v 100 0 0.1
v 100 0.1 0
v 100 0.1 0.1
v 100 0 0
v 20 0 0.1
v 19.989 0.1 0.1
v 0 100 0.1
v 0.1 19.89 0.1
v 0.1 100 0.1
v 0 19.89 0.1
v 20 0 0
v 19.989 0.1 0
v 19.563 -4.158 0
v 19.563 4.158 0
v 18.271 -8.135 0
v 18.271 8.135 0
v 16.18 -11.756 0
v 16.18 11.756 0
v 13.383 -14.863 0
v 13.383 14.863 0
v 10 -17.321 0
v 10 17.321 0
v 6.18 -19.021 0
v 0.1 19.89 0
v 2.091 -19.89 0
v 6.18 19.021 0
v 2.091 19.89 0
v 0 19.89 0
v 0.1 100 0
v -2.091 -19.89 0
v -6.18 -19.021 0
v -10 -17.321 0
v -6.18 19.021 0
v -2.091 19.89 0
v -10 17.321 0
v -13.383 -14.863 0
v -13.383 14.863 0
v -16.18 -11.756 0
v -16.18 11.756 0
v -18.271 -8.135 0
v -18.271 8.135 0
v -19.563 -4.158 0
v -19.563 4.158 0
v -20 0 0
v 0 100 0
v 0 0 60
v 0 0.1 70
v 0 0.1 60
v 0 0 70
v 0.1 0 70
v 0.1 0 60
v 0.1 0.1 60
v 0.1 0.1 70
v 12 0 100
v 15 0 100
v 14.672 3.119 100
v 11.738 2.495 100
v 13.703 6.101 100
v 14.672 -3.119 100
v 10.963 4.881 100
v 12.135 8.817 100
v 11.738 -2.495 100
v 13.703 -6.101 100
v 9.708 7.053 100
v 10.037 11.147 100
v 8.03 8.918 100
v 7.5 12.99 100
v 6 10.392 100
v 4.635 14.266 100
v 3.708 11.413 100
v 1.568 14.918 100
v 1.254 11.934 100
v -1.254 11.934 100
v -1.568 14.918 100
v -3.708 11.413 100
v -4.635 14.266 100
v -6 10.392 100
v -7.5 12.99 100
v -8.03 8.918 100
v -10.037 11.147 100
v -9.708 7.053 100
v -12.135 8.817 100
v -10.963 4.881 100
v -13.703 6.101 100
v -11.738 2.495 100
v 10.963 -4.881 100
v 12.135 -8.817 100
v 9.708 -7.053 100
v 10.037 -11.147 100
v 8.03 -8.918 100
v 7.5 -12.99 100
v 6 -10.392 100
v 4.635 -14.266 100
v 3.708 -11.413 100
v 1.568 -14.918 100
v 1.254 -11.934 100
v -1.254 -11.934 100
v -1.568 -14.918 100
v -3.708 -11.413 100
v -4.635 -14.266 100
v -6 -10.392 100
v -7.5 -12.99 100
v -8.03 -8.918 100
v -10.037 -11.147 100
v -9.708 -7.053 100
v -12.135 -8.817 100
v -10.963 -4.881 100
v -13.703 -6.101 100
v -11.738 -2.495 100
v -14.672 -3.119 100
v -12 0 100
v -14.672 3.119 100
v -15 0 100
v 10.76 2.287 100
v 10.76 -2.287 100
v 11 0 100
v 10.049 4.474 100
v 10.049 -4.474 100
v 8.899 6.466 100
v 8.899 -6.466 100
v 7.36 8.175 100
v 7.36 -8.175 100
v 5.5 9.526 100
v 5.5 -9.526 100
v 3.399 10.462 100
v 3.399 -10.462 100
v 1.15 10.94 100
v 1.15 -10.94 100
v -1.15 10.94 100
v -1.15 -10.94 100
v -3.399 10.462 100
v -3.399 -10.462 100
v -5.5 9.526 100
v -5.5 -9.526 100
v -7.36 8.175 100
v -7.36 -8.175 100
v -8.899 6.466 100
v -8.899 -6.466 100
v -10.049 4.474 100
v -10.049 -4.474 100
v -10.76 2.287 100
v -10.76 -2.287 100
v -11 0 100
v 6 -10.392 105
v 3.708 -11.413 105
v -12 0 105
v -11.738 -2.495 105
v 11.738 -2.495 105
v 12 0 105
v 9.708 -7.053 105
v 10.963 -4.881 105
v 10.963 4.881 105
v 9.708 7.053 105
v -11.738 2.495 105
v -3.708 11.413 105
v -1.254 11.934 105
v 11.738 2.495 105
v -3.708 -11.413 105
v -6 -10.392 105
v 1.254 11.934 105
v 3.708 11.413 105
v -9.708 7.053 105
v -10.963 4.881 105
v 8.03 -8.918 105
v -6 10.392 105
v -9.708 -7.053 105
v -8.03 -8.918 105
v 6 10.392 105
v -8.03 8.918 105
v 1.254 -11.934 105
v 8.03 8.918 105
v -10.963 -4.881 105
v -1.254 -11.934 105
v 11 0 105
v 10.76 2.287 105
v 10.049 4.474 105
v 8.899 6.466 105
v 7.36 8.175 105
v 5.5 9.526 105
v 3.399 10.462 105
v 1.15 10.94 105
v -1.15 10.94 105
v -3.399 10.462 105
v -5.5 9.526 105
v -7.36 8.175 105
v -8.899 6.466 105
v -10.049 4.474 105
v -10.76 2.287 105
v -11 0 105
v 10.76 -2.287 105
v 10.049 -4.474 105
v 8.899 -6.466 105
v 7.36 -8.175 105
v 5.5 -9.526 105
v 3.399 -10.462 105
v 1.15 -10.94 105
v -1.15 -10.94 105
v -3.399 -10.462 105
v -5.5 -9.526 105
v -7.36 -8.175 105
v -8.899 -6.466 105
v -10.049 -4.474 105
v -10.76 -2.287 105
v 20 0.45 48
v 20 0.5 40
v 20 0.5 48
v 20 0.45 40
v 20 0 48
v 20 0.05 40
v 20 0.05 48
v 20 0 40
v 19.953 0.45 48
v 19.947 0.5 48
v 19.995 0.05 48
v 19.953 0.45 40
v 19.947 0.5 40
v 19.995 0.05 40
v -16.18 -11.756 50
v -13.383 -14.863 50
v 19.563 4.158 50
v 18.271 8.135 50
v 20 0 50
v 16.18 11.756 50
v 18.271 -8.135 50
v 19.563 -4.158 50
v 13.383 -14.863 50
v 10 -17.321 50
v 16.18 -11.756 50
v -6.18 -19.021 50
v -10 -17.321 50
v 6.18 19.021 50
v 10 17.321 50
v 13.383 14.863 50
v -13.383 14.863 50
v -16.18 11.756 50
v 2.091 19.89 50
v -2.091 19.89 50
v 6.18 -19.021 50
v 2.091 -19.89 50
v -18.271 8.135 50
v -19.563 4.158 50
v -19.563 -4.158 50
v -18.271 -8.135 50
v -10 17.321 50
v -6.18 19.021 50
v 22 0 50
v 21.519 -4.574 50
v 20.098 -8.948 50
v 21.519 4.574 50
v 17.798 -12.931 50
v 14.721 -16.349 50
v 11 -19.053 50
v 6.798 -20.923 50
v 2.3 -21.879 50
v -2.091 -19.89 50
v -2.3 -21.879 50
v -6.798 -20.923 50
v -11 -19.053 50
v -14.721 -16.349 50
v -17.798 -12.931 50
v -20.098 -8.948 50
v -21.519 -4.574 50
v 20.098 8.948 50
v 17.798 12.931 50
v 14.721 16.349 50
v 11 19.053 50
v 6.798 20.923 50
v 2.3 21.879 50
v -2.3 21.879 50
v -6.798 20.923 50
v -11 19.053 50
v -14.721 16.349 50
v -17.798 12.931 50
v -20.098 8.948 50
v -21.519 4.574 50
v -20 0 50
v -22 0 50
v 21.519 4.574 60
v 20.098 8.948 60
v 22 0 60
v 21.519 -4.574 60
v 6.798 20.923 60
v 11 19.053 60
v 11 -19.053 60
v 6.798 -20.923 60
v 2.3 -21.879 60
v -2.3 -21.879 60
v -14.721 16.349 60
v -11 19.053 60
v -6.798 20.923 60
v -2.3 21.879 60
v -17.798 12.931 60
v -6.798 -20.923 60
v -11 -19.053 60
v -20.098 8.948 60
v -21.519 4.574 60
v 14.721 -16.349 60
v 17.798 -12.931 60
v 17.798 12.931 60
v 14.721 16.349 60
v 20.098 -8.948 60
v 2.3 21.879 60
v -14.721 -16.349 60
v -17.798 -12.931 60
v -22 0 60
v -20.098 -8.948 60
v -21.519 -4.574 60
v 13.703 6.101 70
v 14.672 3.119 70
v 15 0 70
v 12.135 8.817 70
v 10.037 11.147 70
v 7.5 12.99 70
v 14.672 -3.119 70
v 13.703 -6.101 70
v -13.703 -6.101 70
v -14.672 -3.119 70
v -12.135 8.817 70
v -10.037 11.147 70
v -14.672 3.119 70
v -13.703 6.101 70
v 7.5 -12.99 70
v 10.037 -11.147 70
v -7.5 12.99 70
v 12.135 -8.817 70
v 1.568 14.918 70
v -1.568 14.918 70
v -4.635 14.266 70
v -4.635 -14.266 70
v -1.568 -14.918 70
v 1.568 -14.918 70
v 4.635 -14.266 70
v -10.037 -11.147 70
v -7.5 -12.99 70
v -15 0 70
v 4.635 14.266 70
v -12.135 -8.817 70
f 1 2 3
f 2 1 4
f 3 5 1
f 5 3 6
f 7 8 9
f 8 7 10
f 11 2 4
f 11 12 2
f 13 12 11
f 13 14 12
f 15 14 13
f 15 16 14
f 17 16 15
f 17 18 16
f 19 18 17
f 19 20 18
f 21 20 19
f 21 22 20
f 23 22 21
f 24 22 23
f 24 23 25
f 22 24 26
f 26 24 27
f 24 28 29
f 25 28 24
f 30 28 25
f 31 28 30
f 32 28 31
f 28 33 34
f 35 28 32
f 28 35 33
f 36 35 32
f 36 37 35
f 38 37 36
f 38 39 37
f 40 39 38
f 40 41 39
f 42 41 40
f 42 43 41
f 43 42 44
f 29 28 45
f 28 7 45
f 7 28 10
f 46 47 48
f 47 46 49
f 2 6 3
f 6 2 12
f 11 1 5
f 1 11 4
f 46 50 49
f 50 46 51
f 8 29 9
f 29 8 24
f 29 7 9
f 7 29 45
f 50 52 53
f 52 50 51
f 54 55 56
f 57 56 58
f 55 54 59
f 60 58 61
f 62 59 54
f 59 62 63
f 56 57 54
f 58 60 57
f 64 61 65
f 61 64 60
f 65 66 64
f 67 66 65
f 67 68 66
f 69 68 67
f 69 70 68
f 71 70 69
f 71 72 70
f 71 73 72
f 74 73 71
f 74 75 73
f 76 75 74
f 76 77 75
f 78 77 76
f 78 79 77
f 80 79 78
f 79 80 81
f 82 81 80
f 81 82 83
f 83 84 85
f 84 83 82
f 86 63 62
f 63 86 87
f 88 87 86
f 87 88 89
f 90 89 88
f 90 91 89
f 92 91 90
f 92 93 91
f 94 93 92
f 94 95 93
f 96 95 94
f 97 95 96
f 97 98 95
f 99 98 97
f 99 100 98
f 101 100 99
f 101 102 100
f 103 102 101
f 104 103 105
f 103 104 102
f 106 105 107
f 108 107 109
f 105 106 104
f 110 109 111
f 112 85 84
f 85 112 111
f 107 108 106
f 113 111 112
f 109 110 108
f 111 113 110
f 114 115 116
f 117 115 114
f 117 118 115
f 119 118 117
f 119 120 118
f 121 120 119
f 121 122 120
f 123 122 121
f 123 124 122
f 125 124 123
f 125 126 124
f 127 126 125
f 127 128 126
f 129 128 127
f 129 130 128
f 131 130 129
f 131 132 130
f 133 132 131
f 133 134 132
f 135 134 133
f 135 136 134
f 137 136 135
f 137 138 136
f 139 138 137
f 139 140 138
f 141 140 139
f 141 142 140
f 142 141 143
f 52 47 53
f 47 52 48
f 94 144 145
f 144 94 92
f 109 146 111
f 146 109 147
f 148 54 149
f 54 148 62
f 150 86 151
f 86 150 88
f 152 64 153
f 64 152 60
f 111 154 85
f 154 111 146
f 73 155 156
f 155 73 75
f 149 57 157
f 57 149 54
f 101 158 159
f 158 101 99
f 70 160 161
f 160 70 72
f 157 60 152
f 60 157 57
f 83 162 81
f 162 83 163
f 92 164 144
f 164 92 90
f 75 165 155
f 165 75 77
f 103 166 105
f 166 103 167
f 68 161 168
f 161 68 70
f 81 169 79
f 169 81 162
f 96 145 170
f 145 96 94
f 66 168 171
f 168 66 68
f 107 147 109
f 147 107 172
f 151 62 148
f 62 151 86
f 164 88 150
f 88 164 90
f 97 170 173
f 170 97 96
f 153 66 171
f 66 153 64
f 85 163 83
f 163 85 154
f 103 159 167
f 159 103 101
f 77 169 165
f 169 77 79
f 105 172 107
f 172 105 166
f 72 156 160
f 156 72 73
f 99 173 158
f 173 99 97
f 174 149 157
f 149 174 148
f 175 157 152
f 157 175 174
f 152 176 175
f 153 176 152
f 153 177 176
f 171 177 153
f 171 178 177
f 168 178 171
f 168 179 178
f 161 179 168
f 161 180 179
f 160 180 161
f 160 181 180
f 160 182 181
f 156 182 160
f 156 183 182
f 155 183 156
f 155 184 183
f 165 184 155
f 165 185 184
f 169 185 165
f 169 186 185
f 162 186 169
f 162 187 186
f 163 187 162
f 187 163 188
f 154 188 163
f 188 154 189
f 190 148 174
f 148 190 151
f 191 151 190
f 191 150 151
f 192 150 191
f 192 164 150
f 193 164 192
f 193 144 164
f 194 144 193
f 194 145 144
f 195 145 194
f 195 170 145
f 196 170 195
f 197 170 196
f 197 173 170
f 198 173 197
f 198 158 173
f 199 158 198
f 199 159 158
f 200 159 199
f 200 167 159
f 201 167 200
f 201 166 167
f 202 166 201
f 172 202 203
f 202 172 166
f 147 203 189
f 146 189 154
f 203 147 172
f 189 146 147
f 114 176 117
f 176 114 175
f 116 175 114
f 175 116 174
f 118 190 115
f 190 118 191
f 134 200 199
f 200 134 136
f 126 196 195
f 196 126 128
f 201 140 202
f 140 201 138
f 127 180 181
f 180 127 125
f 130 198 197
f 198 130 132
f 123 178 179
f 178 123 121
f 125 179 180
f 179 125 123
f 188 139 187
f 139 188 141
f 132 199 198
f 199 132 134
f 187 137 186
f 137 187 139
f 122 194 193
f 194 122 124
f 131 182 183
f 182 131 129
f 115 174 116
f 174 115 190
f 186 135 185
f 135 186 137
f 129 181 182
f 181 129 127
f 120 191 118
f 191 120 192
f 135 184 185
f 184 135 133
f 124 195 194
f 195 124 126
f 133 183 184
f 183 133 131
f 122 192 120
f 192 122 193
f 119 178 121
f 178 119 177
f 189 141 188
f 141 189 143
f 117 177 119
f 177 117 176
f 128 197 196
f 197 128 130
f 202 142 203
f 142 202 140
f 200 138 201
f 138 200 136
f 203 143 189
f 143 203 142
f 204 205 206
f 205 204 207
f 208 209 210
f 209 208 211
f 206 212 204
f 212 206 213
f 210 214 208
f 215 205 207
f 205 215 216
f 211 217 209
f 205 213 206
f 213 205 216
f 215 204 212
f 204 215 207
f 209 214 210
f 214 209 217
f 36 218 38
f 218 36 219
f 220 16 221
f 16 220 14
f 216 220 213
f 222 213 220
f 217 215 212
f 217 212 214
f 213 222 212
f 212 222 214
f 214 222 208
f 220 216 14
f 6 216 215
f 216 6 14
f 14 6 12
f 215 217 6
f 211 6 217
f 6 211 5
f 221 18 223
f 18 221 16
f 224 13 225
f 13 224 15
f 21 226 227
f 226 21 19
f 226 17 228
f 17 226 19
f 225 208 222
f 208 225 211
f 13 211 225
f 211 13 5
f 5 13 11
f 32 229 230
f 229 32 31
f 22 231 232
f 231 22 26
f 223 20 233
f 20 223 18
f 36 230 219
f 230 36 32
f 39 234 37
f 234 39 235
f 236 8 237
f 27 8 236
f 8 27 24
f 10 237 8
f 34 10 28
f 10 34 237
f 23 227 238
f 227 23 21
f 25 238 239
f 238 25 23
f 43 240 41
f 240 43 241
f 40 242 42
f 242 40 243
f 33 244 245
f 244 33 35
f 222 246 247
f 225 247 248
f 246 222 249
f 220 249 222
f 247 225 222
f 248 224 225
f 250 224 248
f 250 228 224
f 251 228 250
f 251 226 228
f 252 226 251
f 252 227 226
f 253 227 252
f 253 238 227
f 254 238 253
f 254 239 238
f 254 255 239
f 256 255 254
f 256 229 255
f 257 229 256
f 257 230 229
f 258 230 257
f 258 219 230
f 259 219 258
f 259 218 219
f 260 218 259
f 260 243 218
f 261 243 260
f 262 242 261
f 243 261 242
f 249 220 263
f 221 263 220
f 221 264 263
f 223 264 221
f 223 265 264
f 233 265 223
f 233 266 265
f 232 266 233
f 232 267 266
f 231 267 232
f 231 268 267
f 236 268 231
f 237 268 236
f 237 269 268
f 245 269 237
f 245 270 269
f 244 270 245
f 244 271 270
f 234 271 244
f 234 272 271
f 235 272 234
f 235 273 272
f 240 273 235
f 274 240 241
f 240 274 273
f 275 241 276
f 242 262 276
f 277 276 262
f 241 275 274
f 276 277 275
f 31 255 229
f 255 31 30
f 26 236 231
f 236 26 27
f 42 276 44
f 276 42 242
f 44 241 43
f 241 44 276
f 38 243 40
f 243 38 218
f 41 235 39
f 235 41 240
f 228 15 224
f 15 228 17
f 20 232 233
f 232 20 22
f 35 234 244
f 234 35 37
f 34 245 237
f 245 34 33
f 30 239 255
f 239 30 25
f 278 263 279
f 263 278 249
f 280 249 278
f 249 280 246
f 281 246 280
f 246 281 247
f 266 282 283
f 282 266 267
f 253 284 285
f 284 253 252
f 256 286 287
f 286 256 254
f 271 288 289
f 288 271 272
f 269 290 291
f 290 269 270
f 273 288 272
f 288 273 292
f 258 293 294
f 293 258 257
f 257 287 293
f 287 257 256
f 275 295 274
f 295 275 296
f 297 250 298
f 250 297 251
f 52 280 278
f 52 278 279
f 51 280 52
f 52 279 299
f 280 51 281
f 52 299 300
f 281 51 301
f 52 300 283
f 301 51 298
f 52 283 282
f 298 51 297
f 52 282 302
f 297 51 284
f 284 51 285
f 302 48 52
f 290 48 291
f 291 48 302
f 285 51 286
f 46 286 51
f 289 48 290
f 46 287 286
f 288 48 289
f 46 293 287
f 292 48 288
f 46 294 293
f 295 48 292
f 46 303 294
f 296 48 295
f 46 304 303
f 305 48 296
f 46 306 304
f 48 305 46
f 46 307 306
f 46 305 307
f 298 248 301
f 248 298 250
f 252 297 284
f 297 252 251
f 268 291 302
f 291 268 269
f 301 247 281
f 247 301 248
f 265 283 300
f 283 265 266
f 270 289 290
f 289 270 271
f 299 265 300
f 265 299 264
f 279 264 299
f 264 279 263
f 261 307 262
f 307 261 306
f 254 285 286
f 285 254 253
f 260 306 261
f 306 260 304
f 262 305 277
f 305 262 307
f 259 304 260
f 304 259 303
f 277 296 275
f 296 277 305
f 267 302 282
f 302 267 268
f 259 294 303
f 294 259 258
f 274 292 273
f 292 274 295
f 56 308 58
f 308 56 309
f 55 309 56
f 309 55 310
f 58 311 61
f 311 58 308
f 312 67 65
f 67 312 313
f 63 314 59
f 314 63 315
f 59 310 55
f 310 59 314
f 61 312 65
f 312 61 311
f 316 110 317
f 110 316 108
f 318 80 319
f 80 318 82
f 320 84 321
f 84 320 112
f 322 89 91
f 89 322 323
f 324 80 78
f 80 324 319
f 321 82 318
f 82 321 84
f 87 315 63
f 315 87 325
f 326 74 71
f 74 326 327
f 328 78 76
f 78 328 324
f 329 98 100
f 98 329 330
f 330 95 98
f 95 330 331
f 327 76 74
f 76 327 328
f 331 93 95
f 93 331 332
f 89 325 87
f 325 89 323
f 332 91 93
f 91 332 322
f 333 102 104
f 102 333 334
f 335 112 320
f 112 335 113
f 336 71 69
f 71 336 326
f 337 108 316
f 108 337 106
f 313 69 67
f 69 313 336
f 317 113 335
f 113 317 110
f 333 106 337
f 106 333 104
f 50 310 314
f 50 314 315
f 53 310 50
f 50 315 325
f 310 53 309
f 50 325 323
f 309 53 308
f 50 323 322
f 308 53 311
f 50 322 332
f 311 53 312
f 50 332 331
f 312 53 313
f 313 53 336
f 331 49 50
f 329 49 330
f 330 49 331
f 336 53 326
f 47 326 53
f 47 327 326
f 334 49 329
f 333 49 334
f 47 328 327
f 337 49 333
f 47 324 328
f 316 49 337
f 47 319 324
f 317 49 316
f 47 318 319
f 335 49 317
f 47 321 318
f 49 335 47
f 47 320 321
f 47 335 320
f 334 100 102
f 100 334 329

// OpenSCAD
    // Combined Scene

    // Permanent Model
    
    // Permanent Model (Black)
    color([0, 0, 0]) {
        // Your permanent model code here
        cube([100,0.1,0.1], center = false);
        cube([0.1,100,0.1], center = false);
        cube([0.1,0.1,100], center = false);
    }
    

    // Dynamic Model
    cylinder(h = 50, r = 20); // Main body as a true cylinder
translate([0, 0, 50]) {
    scale([1.1, 1.1, 0.5]) 
        cylinder(h = 20, r1 = 20, r2 = 20); // Enhanced rounded shoulder for smooth transition
}
translate([0, 0, 70]) {
    cylinder(h = 25, r = 15); // Consistent neck with a uniform diameter
}
translate([0, 0, 95]) {
    cylinder(h = 5, r = 15); // Flat base for stability
}
translate([0, 0, 95]) {
    difference() {
        cylinder(h = 10, r = 12); // Cap body with flat profile
        translate([0, 0, -1]) 
            cylinder(h = 11, r = 11); // Indentation for cap
    }
}
translate([0, 0, 85]) {
    for (i = [0 : 11]) {
        rotate(i * 30) {
            translate([0, 5, 0]) {
                cube([1, 0.2, 4]); // Uniform ribbed texture along the neck
            }
        }
    }
}
translate([0, 0, 40]) {
    difference() {
        cube([20, 0.5, 8]); // Labeling area with distinct flat surface
        translate([0, 0.05, 0]) 
            cube([20, 0.4, 8]); // Indentation for label
    }
}
    
